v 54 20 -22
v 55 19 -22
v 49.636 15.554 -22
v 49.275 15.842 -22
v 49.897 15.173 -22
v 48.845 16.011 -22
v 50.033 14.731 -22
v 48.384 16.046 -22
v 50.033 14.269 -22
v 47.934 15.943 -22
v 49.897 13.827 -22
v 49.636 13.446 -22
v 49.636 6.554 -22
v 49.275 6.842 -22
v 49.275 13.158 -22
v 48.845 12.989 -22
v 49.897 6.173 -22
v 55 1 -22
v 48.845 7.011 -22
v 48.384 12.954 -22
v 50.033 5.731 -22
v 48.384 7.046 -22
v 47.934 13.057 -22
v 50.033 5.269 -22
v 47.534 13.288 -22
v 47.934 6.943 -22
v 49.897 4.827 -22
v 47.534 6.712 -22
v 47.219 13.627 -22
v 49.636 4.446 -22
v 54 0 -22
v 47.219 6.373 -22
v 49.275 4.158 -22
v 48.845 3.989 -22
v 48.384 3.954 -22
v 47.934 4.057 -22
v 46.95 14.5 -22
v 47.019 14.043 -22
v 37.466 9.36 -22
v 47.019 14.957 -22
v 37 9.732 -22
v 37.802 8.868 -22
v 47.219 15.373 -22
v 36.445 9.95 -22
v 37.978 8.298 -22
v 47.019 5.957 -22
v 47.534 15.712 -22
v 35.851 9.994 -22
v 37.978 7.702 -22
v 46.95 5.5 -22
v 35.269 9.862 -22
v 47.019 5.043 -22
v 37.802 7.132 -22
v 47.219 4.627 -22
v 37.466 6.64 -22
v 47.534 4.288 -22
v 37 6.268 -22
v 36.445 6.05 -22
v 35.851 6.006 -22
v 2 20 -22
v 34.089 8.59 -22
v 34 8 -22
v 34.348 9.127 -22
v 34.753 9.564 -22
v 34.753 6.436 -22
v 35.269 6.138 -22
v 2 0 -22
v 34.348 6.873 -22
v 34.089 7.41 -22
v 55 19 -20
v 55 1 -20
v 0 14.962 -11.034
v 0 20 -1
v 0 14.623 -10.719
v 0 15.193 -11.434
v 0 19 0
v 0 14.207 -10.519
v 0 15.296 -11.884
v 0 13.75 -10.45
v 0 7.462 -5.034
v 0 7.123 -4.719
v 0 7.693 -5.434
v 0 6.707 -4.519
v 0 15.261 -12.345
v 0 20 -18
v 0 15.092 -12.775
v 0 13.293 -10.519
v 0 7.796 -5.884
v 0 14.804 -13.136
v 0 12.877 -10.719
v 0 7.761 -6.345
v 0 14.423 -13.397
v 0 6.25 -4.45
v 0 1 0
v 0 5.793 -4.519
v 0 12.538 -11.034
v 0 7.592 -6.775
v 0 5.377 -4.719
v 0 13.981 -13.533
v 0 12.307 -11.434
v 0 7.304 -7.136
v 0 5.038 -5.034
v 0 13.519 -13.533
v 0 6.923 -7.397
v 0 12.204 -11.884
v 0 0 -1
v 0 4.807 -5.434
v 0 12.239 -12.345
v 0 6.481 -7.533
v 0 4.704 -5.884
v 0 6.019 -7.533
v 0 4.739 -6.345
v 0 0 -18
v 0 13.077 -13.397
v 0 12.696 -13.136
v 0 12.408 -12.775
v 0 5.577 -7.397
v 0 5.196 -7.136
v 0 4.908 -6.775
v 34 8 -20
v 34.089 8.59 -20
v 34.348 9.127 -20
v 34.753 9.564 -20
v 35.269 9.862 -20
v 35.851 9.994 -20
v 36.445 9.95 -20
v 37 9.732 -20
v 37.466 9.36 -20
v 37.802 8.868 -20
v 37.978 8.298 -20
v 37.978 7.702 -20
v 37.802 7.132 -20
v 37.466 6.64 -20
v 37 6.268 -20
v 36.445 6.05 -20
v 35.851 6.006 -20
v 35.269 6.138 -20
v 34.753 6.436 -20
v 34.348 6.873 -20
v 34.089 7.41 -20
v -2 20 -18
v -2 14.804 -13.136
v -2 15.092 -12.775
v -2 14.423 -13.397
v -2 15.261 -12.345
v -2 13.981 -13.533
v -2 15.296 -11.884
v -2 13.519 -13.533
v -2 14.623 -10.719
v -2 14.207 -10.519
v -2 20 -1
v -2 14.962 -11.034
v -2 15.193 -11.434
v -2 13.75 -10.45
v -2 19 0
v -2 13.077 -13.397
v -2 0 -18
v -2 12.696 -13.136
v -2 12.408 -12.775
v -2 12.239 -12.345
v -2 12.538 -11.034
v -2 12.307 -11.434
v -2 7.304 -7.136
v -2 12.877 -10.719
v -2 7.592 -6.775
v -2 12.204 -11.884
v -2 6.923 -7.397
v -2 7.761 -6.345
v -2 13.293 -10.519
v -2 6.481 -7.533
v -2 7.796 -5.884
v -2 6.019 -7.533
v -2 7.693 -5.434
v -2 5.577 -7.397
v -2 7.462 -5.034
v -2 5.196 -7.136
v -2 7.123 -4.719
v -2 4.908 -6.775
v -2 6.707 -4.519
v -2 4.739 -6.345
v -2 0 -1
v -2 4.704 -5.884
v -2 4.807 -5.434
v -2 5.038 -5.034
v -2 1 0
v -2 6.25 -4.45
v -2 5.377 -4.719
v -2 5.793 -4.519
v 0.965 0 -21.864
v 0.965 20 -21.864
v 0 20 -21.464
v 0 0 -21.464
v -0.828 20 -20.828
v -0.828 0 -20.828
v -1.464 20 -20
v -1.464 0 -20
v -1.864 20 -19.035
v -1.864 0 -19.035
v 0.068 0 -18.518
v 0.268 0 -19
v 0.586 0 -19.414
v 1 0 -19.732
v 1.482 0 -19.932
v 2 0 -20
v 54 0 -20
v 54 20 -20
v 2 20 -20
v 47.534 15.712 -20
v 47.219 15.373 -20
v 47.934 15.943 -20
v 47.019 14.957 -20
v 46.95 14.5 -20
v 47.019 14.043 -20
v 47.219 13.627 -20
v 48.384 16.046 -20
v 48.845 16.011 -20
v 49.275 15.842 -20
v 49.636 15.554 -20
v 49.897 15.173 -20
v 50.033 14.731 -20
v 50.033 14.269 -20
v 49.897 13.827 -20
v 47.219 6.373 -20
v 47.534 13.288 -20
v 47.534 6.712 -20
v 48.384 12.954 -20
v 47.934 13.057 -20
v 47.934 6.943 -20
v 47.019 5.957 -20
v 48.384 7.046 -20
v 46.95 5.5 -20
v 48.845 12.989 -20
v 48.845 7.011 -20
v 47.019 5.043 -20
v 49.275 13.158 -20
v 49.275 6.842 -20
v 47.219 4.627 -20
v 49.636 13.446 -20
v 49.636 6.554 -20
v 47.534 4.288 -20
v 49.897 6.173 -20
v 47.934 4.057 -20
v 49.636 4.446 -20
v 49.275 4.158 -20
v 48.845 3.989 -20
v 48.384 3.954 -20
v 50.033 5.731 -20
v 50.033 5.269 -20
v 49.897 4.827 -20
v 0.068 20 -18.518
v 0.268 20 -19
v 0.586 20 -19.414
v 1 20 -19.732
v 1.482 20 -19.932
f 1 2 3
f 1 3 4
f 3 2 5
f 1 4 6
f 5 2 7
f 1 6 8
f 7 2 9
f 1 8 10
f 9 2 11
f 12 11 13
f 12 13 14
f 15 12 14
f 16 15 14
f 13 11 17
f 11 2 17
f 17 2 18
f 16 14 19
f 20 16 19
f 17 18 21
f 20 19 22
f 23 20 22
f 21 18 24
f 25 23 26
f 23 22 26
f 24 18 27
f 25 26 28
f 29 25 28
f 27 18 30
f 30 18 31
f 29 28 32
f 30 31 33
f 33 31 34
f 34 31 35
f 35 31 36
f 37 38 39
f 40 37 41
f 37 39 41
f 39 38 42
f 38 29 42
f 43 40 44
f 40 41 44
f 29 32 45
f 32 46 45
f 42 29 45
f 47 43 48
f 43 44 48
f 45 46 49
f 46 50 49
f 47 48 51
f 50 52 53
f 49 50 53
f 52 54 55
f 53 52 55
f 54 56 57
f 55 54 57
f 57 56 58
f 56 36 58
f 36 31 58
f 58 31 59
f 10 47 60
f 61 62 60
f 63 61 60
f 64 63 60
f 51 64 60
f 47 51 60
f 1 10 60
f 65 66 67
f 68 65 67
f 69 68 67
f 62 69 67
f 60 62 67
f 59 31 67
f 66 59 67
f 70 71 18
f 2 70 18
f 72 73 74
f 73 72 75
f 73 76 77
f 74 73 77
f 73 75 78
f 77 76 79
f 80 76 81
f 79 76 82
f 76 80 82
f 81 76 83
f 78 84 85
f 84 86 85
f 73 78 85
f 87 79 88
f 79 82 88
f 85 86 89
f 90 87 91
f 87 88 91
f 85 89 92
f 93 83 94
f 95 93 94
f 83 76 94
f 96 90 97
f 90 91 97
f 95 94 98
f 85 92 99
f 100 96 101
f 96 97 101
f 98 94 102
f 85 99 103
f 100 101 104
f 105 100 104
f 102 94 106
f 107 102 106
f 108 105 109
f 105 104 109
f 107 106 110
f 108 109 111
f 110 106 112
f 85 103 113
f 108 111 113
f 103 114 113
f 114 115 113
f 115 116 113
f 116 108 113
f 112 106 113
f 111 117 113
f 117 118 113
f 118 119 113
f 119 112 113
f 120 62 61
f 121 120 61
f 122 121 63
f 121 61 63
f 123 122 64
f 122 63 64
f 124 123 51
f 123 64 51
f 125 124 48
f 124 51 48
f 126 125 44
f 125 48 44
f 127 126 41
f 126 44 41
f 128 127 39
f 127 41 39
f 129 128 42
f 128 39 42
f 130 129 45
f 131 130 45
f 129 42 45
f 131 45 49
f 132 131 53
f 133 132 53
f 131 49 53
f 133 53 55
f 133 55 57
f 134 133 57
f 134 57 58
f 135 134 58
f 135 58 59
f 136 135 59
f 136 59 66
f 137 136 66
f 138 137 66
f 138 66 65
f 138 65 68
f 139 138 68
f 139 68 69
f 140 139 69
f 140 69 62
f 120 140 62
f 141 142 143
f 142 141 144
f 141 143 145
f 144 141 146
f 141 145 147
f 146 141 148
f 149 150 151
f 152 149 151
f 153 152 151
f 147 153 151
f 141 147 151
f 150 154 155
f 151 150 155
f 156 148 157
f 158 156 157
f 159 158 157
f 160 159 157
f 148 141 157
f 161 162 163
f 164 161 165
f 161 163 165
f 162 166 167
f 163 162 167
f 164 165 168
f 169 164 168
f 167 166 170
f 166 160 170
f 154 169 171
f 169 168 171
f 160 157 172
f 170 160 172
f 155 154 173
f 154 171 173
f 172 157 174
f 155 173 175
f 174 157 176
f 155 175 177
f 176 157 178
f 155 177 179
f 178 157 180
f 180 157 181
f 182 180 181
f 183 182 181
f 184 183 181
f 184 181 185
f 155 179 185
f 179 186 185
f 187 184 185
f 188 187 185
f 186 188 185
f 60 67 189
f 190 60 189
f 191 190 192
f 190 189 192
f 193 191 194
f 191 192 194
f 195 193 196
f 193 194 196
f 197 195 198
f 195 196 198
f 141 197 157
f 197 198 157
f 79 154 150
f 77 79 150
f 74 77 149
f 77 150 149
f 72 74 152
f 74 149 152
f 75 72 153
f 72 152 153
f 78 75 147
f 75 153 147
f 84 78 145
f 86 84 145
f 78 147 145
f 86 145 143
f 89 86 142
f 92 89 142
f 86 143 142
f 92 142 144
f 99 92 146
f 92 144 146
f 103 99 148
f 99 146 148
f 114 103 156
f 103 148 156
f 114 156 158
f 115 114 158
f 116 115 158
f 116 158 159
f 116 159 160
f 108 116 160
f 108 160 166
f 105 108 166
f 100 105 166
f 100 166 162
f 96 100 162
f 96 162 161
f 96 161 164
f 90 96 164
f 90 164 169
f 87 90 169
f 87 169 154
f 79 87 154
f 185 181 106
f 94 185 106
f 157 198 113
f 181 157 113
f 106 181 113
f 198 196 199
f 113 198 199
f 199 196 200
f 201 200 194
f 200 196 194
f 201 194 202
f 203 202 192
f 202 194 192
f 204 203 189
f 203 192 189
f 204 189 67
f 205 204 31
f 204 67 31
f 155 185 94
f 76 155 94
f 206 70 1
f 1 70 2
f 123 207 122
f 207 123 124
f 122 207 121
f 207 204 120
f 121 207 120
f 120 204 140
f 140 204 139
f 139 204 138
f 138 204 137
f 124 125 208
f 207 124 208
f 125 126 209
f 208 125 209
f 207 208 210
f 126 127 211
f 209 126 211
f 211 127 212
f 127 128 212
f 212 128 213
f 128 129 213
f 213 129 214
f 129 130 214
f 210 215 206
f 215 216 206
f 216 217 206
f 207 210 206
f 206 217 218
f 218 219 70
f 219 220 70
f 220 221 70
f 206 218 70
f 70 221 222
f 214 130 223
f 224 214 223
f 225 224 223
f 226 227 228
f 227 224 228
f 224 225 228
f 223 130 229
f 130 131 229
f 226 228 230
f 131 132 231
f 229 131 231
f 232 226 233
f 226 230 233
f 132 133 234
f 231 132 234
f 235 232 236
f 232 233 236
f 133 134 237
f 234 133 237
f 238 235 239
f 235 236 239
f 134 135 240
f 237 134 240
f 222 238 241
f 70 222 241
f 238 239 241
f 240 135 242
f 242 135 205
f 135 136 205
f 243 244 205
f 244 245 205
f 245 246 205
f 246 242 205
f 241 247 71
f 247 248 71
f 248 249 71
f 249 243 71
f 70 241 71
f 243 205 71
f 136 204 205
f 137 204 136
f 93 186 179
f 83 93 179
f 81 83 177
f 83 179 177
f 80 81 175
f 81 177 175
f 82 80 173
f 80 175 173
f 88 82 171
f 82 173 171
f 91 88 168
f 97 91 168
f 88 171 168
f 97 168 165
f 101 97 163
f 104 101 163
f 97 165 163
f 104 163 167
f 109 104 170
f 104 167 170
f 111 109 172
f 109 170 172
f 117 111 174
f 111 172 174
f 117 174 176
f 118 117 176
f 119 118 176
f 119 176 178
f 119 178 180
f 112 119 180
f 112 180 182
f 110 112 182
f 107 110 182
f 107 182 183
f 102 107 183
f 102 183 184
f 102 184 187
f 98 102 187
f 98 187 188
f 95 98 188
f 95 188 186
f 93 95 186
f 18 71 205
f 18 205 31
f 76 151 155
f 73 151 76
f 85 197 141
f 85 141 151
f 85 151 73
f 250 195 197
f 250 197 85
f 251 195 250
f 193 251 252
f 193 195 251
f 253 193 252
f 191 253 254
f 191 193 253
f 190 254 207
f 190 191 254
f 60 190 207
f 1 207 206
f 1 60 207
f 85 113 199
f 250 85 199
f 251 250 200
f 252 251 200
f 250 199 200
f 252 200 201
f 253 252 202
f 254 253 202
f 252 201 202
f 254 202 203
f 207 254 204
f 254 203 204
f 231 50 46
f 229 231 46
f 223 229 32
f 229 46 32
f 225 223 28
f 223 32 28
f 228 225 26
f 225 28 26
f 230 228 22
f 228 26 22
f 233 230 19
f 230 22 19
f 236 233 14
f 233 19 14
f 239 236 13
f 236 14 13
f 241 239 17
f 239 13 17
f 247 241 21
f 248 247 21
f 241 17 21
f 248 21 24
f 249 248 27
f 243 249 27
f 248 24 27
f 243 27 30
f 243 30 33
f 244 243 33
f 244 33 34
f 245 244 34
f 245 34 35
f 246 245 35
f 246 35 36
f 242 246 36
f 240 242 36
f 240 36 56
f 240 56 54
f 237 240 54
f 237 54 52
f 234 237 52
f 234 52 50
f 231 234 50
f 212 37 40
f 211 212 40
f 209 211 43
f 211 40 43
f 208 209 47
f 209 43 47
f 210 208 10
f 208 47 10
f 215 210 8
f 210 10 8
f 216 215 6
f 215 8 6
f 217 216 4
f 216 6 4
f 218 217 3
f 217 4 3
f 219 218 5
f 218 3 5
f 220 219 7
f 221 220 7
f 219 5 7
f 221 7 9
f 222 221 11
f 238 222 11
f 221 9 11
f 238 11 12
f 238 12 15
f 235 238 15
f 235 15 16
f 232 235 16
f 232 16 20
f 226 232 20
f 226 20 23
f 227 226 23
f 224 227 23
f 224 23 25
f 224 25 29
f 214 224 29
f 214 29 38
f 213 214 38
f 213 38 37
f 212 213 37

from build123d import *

# Parameters (mm, degrees)
BASE_DEPTH           = 20
SKETCH2_R            = 1.55
GUIDESIDEHOLES_DEPTH = 20
SKETCH3_R            = 1.55
FOOTSIDEHOLES_DEPTH  = 63.521996129
CHAMFER1_SIZE        = 1
SKETCH4_R            = 2
CABLETIEHOLE_DEPTH   = 63.521996129


with BuildPart() as part:
    # Sketch1 → Base (new body)
    with BuildSketch(Plane(origin=(0, 0, 0), x_dir=(1, 0, 0), z_dir=(0, 1, 0))):
        with BuildLine():
            Line((0, 0), (0, 18))
            ThreePointArc((0, 18), (0.585786438, 19.414213562), (2, 20))
            Line((2, 20), (55, 20))
            Line((55, 20), (55, 22))
            Line((55, 22), (2, 22))
            ThreePointArc((2, 22), (-0.828427125, 20.828427125), (-2, 18))
            Line((-2, 18), (-2, 0))
            Line((-2, 0), (0, 0))
        make_face()
    extrude(amount=BASE_DEPTH)

    # Sketch2 → GuideSideHoles (cut)
    with BuildSketch(Plane.ZY.offset(2)):
        with Locations((-12, 13.75)):
            Circle(SKETCH2_R)
        with Locations((-6, 6.25)):
            Circle(SKETCH2_R)
    extrude(amount=-GUIDESIDEHOLES_DEPTH, mode=Mode.SUBTRACT)

    # Sketch3 → FootSideHoles (cut, through all)
    with BuildSketch(Plane(origin=(0, 0, -22), x_dir=(-1, 0, 0), z_dir=(0, 0, -1))):
        with Locations((-48.5, 14.5)):
            Circle(SKETCH3_R)
        with Locations((-48.5, 5.5)):
            Circle(SKETCH3_R)
    extrude(amount=-FOOTSIDEHOLES_DEPTH, mode=Mode.SUBTRACT)

    # Chamfer1
    chamfer1_edges = [part.edges().sort_by_distance(p)[0] for p in [
        (-1, 0, 0),
        (55, 0, -21),
        (-1, 20, 0),
        (55, 20, -21),
    ]]
    chamfer(chamfer1_edges, length=CHAMFER1_SIZE)

    # Sketch4 → CableTieHole (cut, through all)
    with BuildSketch(Plane(origin=(0, 0, -22), x_dir=(-1, 0, 0), z_dir=(0, 0, -1))):
        with Locations((-36, 8)):
            Circle(SKETCH4_R)
    extrude(amount=-CABLETIEHOLE_DEPTH, mode=Mode.SUBTRACT)


solid = part.part
